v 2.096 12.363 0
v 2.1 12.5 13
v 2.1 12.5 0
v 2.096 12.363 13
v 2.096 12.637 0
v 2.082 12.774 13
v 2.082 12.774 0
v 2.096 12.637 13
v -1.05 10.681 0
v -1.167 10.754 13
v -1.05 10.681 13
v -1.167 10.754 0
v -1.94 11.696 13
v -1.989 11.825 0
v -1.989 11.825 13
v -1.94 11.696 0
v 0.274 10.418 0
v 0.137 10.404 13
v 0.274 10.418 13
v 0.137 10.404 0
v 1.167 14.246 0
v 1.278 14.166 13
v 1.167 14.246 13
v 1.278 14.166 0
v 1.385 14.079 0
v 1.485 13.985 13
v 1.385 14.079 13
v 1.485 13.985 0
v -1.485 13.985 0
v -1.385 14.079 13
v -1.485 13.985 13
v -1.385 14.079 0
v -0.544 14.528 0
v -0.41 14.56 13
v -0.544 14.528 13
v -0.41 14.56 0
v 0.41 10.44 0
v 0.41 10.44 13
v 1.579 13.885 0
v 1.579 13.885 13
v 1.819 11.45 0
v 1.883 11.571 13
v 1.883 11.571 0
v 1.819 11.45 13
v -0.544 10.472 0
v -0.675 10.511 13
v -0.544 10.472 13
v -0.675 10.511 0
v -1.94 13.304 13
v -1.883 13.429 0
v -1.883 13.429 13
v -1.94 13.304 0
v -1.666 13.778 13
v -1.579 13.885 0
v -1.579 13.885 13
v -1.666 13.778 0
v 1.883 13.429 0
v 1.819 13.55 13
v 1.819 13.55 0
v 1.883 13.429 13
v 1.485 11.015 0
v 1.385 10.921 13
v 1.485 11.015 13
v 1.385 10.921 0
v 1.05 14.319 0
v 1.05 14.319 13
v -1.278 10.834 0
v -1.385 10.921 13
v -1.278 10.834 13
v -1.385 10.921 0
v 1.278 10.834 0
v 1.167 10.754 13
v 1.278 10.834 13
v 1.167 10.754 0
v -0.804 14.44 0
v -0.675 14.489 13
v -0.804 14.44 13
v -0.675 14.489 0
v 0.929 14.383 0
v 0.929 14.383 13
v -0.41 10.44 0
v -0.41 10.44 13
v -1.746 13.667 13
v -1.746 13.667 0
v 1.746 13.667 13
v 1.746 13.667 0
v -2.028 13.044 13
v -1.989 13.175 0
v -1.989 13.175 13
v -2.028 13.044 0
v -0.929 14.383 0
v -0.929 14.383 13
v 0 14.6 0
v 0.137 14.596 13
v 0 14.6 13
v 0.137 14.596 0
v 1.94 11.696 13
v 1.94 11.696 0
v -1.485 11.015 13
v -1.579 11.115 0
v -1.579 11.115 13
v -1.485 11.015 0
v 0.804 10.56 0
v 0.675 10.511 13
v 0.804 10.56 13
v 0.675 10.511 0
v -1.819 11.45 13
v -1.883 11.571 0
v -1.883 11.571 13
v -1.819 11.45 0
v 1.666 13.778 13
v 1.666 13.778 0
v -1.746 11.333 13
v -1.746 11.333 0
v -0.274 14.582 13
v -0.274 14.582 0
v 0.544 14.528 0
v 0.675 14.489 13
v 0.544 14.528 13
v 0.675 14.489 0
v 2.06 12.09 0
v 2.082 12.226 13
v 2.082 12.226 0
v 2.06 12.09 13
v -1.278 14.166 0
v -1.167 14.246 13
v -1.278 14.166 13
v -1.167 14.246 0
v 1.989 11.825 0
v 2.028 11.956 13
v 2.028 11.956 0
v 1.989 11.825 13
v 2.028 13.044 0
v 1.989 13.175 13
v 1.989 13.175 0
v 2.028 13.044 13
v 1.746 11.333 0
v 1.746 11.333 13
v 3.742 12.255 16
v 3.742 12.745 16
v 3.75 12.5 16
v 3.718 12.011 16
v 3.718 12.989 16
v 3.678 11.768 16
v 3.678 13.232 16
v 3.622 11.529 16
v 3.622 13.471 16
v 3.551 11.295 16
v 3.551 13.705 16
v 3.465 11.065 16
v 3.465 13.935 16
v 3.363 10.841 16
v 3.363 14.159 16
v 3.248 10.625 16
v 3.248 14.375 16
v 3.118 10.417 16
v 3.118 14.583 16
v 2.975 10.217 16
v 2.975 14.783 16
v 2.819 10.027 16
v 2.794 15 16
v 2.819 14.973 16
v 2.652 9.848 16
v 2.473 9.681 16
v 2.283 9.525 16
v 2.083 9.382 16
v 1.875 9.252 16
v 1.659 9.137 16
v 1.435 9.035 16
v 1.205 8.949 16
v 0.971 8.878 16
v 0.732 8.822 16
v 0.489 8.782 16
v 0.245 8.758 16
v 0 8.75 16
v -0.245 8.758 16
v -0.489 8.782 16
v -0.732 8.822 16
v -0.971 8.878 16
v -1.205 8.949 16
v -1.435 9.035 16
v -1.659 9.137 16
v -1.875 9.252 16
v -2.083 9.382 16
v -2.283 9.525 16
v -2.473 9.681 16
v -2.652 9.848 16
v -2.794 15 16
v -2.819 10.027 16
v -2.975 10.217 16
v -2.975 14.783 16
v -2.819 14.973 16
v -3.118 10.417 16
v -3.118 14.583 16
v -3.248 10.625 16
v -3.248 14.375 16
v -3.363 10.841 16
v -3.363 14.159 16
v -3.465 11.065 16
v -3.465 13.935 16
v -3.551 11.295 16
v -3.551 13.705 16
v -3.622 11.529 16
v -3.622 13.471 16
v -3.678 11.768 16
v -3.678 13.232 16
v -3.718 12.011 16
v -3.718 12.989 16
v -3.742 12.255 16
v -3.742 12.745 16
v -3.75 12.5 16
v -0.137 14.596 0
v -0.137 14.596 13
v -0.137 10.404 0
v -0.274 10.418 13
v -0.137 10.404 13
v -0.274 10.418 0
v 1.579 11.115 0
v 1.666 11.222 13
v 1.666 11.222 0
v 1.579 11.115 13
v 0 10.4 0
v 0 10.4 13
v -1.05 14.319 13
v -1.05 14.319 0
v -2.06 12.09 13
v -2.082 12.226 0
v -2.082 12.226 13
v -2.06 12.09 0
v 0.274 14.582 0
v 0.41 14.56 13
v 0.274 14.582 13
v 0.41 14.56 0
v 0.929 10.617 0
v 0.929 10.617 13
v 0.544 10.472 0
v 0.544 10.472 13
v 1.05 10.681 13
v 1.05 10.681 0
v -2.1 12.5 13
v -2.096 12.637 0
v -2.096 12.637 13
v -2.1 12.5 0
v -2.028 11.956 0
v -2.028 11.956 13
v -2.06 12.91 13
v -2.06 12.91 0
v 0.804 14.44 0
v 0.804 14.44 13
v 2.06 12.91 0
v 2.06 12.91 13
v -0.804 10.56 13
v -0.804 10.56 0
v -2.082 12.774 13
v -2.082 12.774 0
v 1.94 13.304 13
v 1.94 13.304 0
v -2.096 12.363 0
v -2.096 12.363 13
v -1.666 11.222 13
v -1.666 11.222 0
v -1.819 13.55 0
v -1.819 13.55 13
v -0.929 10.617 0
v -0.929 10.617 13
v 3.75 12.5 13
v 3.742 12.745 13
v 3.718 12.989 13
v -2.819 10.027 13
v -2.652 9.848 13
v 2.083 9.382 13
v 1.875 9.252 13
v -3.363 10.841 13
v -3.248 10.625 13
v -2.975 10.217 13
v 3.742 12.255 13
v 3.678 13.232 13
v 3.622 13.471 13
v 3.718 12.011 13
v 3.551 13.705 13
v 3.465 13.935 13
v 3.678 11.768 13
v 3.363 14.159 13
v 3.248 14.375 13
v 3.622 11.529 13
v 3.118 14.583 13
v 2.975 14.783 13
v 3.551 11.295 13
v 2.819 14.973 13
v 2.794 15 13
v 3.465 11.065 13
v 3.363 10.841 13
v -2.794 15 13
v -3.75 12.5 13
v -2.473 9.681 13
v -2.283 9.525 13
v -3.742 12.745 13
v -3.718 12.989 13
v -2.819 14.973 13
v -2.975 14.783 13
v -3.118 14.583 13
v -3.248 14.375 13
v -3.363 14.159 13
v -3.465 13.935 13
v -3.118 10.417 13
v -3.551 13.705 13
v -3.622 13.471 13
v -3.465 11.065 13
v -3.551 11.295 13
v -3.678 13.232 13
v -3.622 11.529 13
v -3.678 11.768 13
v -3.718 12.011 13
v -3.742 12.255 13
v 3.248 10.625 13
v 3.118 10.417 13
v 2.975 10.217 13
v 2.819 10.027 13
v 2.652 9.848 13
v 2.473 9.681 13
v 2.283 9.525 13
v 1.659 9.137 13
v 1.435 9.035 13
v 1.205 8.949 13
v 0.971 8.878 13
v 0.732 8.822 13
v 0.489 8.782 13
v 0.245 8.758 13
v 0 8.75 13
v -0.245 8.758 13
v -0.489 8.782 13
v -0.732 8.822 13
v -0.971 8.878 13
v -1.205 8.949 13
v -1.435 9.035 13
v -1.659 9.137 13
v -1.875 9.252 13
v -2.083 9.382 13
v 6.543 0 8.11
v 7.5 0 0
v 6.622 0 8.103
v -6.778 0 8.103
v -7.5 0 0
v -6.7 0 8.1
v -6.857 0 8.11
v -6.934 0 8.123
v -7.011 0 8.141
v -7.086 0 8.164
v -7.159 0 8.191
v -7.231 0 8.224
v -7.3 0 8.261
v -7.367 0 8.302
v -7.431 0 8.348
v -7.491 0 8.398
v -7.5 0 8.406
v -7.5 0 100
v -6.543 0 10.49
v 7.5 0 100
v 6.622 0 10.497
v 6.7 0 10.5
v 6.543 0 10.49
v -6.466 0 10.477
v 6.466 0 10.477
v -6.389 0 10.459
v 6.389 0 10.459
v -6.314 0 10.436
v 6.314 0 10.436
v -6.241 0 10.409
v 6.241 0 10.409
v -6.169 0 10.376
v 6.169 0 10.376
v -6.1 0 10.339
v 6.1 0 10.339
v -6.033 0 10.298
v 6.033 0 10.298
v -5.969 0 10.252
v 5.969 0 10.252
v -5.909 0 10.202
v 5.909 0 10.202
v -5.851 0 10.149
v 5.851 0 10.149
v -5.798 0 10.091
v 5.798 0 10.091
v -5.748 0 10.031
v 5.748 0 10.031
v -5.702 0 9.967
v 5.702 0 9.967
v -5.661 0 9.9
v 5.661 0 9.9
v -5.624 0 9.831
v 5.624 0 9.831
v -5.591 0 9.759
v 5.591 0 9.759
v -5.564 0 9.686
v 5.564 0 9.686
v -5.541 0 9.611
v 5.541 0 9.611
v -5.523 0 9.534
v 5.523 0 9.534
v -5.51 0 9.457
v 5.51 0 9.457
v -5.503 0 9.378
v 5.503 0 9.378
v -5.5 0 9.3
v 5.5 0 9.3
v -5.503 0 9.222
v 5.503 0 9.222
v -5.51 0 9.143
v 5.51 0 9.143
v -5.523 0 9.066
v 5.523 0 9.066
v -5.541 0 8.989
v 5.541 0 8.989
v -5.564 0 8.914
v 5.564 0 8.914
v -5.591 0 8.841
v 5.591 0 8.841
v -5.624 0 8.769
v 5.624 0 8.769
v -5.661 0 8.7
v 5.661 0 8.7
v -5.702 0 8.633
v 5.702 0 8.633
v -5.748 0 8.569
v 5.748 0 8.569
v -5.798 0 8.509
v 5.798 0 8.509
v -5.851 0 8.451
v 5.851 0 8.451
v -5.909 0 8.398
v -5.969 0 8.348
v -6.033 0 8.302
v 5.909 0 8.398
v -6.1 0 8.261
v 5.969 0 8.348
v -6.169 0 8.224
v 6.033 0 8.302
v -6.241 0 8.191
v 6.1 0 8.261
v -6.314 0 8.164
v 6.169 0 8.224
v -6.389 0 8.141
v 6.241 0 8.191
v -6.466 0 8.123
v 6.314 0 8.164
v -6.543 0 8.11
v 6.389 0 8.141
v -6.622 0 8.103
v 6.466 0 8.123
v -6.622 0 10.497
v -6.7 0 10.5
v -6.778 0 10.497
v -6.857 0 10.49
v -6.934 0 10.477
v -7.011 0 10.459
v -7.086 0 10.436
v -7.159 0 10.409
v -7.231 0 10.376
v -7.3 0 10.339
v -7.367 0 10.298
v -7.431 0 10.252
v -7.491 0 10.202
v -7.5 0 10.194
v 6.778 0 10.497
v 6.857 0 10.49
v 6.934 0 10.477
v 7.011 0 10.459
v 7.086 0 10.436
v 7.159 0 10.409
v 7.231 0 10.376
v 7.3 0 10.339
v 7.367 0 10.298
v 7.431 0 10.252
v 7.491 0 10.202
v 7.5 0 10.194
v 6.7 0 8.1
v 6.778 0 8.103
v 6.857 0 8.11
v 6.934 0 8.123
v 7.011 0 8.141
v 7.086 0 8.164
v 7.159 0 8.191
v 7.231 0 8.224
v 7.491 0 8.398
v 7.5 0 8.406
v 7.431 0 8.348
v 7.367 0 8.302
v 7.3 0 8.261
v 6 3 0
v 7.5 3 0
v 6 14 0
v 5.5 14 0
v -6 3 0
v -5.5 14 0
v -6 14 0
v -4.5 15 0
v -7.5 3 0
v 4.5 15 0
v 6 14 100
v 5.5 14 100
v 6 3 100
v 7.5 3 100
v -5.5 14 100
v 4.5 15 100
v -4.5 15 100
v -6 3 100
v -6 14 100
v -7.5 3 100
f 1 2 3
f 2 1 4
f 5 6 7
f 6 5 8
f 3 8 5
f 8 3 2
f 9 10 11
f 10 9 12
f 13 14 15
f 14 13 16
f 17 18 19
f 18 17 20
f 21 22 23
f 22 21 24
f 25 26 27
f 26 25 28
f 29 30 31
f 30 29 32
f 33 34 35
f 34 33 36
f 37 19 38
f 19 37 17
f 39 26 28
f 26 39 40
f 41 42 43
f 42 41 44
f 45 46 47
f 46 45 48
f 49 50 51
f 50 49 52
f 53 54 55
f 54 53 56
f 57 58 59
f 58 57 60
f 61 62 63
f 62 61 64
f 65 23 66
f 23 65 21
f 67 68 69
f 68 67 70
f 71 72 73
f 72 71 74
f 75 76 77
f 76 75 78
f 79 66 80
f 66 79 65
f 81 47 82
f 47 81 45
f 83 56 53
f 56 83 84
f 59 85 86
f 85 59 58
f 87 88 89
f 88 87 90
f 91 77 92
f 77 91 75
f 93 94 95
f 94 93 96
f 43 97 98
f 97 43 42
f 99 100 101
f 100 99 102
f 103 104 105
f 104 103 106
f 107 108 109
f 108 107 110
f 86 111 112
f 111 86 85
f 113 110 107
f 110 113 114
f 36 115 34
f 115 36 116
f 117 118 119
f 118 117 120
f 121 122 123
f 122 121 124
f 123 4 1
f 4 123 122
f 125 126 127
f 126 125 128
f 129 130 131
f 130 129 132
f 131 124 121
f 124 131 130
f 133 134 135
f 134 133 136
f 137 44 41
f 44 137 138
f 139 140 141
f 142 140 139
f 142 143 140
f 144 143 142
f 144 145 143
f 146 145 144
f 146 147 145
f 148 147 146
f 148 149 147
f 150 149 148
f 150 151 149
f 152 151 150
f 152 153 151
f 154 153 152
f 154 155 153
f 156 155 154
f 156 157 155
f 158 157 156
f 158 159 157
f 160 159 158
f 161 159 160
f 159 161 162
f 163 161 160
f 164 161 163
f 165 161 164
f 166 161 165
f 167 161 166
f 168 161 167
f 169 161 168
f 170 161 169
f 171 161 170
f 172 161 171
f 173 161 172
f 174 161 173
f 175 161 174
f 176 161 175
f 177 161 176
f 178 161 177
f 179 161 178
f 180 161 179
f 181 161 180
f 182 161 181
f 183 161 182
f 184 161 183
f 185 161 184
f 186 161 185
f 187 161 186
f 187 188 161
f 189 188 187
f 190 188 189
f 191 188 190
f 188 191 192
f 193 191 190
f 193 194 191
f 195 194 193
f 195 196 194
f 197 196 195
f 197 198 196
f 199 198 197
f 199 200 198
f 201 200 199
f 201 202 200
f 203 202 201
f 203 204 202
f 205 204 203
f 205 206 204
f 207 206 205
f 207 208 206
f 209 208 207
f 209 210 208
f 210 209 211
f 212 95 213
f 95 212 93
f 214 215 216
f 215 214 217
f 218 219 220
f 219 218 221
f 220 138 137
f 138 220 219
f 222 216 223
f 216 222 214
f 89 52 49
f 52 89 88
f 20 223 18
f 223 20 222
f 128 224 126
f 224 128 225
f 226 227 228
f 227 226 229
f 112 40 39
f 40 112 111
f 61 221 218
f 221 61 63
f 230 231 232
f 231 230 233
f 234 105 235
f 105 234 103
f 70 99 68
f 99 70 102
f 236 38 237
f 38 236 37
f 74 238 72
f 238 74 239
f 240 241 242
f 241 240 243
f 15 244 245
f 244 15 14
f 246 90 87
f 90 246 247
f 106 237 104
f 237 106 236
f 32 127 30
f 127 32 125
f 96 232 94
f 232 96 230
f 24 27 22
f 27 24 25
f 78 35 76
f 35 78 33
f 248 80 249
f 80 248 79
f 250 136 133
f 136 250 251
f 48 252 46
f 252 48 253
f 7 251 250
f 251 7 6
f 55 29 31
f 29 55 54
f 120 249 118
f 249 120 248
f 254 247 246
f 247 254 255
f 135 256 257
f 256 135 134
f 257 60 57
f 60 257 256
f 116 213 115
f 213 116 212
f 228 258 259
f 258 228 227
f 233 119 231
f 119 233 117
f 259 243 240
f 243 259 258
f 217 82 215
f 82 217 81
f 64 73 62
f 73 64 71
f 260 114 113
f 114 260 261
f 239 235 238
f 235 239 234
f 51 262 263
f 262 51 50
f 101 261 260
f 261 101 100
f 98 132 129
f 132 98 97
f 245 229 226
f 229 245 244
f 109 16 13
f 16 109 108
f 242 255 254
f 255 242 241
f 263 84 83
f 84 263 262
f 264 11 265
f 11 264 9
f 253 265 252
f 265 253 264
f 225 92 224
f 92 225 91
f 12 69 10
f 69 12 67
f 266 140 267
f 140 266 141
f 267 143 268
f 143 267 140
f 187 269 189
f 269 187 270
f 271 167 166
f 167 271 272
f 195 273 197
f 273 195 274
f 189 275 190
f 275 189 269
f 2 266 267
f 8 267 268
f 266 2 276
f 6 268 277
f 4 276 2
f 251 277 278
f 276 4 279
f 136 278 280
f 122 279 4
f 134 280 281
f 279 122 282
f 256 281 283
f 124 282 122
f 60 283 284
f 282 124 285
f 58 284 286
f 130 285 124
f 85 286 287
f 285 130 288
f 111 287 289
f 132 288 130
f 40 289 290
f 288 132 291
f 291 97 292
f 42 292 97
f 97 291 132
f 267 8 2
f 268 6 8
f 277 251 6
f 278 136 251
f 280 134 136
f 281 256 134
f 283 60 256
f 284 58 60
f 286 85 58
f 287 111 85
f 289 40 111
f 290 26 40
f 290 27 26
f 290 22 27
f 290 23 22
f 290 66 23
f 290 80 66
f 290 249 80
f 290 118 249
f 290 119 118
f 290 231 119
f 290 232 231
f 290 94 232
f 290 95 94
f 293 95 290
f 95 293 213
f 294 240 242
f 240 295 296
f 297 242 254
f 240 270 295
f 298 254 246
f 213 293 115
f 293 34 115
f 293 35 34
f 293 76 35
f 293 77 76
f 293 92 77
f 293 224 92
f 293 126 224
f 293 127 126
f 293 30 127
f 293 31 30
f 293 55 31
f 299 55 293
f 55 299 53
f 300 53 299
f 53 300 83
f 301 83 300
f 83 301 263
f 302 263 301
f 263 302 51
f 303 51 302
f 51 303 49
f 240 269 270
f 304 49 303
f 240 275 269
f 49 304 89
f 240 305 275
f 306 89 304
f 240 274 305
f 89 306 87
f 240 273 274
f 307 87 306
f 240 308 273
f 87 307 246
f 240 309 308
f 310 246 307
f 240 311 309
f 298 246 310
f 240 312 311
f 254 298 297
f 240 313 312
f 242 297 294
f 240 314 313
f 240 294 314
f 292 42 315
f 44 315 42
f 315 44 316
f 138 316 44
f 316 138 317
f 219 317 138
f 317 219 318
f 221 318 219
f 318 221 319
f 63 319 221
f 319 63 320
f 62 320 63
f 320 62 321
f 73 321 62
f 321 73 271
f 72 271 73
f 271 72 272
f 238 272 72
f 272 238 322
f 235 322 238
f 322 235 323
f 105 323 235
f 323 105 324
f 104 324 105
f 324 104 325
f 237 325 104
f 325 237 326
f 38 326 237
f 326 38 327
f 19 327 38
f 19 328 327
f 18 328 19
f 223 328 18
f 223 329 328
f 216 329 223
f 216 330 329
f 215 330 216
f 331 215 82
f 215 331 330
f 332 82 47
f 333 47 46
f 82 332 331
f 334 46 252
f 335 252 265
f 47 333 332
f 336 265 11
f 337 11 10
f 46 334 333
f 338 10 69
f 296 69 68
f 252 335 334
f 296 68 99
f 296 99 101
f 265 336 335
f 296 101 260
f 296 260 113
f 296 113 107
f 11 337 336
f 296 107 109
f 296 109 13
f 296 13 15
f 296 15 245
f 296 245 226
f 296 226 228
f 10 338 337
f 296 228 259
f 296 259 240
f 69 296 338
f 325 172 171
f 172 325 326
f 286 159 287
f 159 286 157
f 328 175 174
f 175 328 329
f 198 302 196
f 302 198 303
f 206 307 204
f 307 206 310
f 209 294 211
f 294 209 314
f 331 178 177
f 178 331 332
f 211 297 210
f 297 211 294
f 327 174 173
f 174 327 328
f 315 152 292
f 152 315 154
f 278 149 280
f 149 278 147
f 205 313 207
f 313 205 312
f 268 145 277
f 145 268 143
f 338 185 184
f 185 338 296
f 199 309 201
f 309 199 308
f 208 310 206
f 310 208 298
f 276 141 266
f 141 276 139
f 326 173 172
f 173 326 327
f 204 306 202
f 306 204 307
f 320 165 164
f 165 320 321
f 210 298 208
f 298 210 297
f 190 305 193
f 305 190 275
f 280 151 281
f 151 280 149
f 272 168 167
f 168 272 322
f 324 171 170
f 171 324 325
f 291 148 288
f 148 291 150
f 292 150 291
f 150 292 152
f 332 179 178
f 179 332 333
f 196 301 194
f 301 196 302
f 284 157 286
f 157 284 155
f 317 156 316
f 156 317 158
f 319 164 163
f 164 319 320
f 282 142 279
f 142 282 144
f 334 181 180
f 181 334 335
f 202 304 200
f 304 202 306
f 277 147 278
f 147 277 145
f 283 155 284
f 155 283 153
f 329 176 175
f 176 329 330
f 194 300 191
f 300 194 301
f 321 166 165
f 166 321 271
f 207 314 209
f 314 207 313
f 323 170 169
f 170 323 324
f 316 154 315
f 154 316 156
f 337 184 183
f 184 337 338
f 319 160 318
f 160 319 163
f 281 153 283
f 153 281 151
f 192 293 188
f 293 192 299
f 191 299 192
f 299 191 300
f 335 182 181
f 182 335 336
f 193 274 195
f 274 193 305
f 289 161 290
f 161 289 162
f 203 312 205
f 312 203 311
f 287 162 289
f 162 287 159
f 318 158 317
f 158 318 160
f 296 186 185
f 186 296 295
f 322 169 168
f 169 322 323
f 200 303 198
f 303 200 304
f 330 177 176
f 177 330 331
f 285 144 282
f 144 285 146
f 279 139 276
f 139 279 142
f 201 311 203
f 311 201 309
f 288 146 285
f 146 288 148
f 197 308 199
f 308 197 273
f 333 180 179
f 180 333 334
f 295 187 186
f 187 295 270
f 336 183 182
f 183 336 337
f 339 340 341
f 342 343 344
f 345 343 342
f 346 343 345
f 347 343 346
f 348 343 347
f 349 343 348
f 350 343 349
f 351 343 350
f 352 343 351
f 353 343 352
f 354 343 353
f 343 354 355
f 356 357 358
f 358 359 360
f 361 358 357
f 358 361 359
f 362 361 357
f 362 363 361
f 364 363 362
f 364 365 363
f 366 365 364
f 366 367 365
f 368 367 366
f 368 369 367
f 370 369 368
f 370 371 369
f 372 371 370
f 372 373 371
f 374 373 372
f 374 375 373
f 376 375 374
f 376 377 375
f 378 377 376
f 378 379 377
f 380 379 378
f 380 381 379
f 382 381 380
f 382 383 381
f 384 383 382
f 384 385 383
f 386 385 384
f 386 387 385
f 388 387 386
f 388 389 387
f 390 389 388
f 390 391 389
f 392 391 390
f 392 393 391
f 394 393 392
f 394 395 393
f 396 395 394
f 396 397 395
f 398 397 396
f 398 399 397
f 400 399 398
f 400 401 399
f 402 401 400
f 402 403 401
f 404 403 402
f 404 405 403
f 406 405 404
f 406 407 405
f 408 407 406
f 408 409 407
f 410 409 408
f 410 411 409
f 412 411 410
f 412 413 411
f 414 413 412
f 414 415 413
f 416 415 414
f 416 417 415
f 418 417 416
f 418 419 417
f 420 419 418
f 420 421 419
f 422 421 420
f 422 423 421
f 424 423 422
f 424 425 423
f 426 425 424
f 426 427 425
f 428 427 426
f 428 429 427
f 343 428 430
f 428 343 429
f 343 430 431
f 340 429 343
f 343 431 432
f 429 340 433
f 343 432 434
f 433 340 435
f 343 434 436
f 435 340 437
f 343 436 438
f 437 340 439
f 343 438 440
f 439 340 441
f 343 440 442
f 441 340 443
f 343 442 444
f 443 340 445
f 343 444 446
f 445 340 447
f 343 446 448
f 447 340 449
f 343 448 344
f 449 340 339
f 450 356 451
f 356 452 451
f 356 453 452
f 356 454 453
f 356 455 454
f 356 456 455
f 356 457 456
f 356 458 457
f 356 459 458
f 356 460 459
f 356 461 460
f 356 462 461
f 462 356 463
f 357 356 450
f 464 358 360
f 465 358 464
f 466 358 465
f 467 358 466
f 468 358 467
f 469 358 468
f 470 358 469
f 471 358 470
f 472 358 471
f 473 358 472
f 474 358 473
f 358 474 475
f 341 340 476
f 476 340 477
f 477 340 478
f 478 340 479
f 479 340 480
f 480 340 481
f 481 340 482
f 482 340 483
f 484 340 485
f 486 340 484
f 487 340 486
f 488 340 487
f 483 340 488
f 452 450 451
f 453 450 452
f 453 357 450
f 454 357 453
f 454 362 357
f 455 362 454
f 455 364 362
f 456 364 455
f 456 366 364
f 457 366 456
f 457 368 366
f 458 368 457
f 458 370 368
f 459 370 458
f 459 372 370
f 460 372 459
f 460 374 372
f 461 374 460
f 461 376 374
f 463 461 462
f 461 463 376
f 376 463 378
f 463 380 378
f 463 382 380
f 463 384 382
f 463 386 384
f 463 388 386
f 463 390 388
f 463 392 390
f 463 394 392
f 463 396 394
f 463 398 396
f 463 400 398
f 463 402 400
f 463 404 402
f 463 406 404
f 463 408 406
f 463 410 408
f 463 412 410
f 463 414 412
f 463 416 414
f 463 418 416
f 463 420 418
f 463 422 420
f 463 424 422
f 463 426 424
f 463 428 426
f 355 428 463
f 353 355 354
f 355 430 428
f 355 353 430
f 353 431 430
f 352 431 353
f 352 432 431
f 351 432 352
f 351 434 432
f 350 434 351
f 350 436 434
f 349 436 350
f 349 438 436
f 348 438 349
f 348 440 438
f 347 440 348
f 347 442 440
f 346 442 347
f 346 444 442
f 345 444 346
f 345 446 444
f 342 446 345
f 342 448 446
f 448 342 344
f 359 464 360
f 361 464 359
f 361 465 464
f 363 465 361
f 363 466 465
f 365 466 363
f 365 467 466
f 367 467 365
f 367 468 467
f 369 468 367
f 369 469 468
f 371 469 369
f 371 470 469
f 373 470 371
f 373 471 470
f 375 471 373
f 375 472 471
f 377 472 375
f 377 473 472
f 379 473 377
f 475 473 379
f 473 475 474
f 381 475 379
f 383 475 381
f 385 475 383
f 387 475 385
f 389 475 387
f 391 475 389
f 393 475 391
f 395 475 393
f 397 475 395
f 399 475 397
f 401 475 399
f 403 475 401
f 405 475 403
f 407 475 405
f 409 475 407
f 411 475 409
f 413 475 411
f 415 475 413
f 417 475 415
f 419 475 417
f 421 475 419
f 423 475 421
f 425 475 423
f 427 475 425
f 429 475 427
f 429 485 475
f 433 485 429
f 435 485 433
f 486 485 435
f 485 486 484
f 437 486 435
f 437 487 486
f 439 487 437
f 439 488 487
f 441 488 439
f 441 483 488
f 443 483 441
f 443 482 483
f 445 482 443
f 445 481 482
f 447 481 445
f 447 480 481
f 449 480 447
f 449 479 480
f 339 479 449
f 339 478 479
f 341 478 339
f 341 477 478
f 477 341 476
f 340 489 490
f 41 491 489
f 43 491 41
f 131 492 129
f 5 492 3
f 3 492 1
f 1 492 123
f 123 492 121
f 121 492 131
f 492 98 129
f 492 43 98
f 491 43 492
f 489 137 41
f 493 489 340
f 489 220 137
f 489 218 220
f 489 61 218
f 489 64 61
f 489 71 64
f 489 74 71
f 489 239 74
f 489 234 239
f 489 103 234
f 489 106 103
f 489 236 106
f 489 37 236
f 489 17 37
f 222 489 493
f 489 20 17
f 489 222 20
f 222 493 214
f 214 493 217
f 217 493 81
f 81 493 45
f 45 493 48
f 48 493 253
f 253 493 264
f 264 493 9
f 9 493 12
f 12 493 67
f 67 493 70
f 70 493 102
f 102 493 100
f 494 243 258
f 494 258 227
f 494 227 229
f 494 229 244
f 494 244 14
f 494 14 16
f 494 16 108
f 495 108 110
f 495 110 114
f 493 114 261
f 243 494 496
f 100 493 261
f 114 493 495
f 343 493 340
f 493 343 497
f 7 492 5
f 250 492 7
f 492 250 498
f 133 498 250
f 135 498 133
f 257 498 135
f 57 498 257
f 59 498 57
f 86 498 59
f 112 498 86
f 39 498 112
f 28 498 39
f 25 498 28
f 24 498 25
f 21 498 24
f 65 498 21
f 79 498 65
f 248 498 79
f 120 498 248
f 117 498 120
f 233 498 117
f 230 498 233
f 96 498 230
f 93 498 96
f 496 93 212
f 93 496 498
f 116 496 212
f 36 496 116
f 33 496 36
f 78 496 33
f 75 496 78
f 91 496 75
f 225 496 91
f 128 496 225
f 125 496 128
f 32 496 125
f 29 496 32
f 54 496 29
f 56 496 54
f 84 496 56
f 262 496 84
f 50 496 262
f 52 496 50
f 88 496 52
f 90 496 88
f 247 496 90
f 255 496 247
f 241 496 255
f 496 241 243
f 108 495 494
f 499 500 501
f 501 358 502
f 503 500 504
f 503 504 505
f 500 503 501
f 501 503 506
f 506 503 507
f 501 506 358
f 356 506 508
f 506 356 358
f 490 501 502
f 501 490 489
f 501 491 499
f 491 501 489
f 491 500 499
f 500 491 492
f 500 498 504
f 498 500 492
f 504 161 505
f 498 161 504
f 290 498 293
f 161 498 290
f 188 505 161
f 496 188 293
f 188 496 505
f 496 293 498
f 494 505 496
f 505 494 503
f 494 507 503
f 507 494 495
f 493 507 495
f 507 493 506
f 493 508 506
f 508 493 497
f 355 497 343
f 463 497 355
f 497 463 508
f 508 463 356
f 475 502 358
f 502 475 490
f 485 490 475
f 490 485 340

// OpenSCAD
$fn = 96;

// Miniature linear guide rail
// Overall envelope: 15mm wide (X) x 15mm tall (Z) x 100mm long (Y)

w = 15.0;   // width (X)
h = 15.0;   // height (Z)
L = 100.0;  // length (Y)

// Profile details (kept within 15x15 envelope)
side_step_h      = 3.0;   // bottom step height
side_step_inset  = 1.5;   // inset per side at the step
top_flat         = 9.0;   // top flat width
top_chamfer      = 1.0;   // top edge chamfer

// Raceway grooves (visual detail, shallow)
race_r = 1.2;             // groove radius
race_depth = 0.8;         // how far groove cuts into side
race_z = h*0.62;          // groove center height

// Mounting holes (through + counterbore)
hole_d = 4.2;
cbo_d  = 7.5;
cbo_h  = 2.0;
hole_pitch = 25.0;
hole_edge_offset = 12.5;  // from each end along Y

eps = 0.02;

module rail_profile_2d() {
    // X-Z polygon, centered on X=0, bottom at Z=0
    polygon(points=[
        [-w/2, 0],
        [ w/2, 0],
        [ w/2, side_step_h],
        [ w/2 - side_step_inset, side_step_h],
        [ w/2 - side_step_inset, h - top_chamfer],
        [ top_flat/2 + top_chamfer, h - top_chamfer],
        [ top_flat/2, h],
        [-top_flat/2, h],
        [-top_flat/2 - top_chamfer, h - top_chamfer],
        [-w/2 + side_step_inset, h - top_chamfer],
        [-w/2 + side_step_inset, side_step_h],
        [-w/2, side_step_h]
    ]);
}

module rail_body() {
    // Correct orientation: extrude along Y directly (no rotate that collapses/offsets)
    translate([0, 0, 0])
        linear_extrude(height=L, center=false, convexity=10)
            rail_profile_2d();
}

module hole_stack_at(ypos) {
    // Drill along Z (vertical). Rail occupies Y in [0..L], so ypos is direct.
    translate([0, ypos, 0])
    union() {
        // Through hole (slightly extended for clean boolean)
        translate([0, 0, -1])
            cylinder(d=hole_d, h=h+2, center=false);

        // Counterbore from top
        translate([0, 0, h - cbo_h])
            cylinder(d=cbo_d, h=cbo_h + 1, center=false);
    }
}

module all_holes() {
    for (ypos = [hole_edge_offset : hole_pitch : (L - hole_edge_offset + 1e-6)])
        hole_stack_at(ypos);
}

module raceways() {
    // Two shallow side grooves running full length (visual raceways)
    // Cylinder axis along Y: rotate X by 90, then place at side faces and correct Z.
    for (sx = [-1, 1]) {
        translate([ sx*(w/2 - race_depth), 0, race_z ])
            rotate([90,0,0])
                cylinder(r=race_r, h=L, center=false);
    }
}

difference() {
    rail_body();
    all_holes();
    raceways();
}
